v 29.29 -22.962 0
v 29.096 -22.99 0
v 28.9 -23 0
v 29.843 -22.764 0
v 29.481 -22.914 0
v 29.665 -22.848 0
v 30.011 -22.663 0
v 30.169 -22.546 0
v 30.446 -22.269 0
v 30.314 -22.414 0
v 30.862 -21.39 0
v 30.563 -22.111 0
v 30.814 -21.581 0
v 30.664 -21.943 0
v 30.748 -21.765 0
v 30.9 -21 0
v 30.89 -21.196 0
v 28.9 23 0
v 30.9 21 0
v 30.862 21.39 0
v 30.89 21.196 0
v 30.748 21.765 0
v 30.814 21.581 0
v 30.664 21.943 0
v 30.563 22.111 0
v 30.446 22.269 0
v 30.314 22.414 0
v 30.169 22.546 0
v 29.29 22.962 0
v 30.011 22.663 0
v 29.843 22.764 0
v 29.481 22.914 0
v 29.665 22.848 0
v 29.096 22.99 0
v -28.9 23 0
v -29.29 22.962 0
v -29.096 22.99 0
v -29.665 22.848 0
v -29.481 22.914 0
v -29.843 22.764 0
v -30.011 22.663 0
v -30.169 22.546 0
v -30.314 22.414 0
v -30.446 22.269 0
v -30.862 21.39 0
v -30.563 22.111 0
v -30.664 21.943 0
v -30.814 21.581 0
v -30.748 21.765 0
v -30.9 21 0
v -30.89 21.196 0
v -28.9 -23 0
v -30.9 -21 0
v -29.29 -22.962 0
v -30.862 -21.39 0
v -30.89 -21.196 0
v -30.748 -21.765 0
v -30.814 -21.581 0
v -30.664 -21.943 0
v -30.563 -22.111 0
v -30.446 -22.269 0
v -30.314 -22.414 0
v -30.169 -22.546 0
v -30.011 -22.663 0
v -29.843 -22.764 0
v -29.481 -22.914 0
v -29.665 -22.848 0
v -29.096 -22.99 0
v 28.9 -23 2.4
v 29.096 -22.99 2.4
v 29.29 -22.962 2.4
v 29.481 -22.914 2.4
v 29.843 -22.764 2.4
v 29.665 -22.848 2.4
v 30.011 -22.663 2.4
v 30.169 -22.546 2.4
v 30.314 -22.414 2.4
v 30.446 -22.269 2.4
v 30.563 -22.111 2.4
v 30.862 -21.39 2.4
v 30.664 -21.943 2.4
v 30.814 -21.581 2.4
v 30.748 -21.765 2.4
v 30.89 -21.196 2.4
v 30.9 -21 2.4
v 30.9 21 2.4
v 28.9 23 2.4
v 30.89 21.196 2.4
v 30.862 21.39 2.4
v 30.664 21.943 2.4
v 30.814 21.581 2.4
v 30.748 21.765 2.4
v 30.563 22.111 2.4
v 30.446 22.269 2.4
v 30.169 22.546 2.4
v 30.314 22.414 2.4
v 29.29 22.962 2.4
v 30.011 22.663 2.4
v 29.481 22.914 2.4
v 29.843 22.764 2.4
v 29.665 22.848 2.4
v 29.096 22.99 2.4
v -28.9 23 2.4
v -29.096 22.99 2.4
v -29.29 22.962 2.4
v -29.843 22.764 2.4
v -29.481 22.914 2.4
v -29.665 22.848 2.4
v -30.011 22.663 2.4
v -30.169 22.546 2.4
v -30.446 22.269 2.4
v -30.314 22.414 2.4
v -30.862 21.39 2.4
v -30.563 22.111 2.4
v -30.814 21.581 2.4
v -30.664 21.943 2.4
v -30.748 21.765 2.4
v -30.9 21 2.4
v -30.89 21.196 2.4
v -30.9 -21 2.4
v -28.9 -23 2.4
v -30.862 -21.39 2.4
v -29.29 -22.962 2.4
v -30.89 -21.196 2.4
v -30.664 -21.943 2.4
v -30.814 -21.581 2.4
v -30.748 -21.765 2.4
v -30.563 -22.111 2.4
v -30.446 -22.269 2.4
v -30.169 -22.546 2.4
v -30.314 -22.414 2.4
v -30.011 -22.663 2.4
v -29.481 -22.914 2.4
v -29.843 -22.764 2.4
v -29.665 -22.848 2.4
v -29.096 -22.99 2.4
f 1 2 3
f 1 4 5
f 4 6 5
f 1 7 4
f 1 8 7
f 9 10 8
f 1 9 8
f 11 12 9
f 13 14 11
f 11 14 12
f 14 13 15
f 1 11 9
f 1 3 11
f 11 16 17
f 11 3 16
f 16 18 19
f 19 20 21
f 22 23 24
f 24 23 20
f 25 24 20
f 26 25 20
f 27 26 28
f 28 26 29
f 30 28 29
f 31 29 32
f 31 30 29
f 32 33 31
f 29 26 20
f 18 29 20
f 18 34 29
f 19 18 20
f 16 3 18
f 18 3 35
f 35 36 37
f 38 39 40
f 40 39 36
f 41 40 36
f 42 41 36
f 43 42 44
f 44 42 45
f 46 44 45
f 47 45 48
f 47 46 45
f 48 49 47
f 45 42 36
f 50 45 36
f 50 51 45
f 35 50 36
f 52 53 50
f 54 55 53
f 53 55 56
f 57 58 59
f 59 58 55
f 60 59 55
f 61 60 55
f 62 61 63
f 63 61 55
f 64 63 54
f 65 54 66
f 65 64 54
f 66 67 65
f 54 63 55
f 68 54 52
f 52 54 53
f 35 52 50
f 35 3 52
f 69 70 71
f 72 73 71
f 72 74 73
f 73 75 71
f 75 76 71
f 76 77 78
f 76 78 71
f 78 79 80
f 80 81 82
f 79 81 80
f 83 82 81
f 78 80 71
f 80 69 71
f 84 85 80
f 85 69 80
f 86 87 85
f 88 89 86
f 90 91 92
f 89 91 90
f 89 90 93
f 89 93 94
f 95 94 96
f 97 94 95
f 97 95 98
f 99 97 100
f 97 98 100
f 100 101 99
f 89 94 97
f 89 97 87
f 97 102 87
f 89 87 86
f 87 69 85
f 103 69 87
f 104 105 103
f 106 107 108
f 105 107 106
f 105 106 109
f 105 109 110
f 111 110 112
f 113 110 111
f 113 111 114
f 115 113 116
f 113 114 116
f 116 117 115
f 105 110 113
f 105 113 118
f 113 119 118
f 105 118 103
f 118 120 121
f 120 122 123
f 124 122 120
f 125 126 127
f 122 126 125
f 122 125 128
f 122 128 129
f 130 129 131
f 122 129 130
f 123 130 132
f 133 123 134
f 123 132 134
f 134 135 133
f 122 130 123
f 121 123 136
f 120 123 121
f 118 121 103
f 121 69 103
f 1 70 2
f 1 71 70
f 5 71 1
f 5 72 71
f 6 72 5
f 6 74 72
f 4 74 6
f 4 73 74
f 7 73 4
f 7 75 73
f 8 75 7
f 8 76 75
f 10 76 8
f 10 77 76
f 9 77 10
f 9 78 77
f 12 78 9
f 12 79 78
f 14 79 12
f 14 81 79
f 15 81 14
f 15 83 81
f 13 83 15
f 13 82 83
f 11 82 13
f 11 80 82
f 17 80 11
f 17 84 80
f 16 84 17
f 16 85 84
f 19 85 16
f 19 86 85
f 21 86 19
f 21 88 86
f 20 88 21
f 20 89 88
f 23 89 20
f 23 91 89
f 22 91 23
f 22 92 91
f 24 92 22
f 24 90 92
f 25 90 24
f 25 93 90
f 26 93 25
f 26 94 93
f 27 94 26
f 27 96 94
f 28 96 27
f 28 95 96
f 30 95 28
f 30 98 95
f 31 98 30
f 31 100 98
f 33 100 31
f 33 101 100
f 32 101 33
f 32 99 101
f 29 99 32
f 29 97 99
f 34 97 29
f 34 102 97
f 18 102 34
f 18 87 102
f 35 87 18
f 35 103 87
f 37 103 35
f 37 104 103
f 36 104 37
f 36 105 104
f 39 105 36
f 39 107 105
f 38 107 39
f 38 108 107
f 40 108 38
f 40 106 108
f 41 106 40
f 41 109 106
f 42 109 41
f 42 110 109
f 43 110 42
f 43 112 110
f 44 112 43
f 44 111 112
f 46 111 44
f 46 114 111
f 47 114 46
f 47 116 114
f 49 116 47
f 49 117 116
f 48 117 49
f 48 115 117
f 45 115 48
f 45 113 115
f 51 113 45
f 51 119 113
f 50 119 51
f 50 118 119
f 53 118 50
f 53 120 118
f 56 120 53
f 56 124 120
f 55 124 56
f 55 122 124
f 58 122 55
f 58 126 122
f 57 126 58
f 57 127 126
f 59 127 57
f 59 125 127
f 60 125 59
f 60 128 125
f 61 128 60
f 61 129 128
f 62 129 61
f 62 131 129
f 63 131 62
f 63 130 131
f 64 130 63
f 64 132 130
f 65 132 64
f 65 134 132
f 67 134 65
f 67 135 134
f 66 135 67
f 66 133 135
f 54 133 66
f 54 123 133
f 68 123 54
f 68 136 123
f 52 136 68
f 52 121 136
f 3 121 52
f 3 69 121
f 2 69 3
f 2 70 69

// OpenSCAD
// file: ../scad/mount_plate.scad
include <params.scad>

// v1: flat tape face matching the body footprint.
// FUTURE (Q6): replace this module body with a brace arm / bolt-on shim
// once the door-side fixed feature is confirmed. Keep the same module name.
module mount_plate() {
  linear_extrude(height = wall)
    offset(r = 2) offset(r = -2)
      square([body_l, body_w], center = true);
}
// file: ../scad/params.scad
// ===== Smart lock enclosure parameters (mm) =====

// --- Print / fit ---
wall          = 2.4;
fit_clearance = 0.4;
$fn           = 64;

// --- SG90 servo (datasheet nominal) ---
servo_body_l  = 22.8;
servo_body_w  = 12.2;
servo_body_h  = 22.5;
servo_tab_l   = 32.2;   // length across mounting tabs
servo_tab_h   = 2.5;
servo_shaft_d = 4.8;    // output boss / horn clearance
servo_screw_d = 2.0;

// --- Raspberry Pi Pico W ---
pico_l        = 51.0;
pico_w        = 21.0;
pico_h        = 1.0;
pico_hole_d   = 2.1;
pico_hole_dx  = 47.0;   // mounting hole spacing along length
pico_hole_dy  = 11.4;   // mounting hole spacing across width
pico_boss_d   = 4.5;
pico_boss_h   = 3.0;

// --- USB micro-B plug clearance (Pico W) ---
usb_w         = 9.0;
usb_h         = 6.0;

// --- Indicators ---
led_hole_d    = 5.2;
button_hole_d = 6.2;

// --- MOSFET footprint (small module) ---
mosfet_w      = 12.0;
mosfet_l      = 16.0;

// --- Thumb-turn knob: PLACEHOLDER — measure real part, then set ---
knob_w        = 8.0;
knob_t        = 4.0;
knob_h        = 12.0;
socket_wall   = 2.0;

// --- Derived enclosure dimensions ---
inner_l = max(servo_tab_l, pico_l) + 6;
inner_w = servo_body_w + pico_w + 8;
inner_h = servo_body_h + pico_boss_h + 6;

body_l = inner_l + 2*wall;
body_w = inner_w + 2*wall;
body_h = inner_h + 2*wall;

// --- Sanity checks ---
assert(wall > 0, "wall must be positive");
assert(fit_clearance >= 0, "fit_clearance must be >= 0");
assert(inner_l >= pico_l, "body too short for Pico");
assert(inner_h >= servo_body_h, "body too short for servo");
// main file
include <../scad/params.scad>
use <../scad/mount_plate.scad>
mount_plate();
echo("mount_plate_test ok");
